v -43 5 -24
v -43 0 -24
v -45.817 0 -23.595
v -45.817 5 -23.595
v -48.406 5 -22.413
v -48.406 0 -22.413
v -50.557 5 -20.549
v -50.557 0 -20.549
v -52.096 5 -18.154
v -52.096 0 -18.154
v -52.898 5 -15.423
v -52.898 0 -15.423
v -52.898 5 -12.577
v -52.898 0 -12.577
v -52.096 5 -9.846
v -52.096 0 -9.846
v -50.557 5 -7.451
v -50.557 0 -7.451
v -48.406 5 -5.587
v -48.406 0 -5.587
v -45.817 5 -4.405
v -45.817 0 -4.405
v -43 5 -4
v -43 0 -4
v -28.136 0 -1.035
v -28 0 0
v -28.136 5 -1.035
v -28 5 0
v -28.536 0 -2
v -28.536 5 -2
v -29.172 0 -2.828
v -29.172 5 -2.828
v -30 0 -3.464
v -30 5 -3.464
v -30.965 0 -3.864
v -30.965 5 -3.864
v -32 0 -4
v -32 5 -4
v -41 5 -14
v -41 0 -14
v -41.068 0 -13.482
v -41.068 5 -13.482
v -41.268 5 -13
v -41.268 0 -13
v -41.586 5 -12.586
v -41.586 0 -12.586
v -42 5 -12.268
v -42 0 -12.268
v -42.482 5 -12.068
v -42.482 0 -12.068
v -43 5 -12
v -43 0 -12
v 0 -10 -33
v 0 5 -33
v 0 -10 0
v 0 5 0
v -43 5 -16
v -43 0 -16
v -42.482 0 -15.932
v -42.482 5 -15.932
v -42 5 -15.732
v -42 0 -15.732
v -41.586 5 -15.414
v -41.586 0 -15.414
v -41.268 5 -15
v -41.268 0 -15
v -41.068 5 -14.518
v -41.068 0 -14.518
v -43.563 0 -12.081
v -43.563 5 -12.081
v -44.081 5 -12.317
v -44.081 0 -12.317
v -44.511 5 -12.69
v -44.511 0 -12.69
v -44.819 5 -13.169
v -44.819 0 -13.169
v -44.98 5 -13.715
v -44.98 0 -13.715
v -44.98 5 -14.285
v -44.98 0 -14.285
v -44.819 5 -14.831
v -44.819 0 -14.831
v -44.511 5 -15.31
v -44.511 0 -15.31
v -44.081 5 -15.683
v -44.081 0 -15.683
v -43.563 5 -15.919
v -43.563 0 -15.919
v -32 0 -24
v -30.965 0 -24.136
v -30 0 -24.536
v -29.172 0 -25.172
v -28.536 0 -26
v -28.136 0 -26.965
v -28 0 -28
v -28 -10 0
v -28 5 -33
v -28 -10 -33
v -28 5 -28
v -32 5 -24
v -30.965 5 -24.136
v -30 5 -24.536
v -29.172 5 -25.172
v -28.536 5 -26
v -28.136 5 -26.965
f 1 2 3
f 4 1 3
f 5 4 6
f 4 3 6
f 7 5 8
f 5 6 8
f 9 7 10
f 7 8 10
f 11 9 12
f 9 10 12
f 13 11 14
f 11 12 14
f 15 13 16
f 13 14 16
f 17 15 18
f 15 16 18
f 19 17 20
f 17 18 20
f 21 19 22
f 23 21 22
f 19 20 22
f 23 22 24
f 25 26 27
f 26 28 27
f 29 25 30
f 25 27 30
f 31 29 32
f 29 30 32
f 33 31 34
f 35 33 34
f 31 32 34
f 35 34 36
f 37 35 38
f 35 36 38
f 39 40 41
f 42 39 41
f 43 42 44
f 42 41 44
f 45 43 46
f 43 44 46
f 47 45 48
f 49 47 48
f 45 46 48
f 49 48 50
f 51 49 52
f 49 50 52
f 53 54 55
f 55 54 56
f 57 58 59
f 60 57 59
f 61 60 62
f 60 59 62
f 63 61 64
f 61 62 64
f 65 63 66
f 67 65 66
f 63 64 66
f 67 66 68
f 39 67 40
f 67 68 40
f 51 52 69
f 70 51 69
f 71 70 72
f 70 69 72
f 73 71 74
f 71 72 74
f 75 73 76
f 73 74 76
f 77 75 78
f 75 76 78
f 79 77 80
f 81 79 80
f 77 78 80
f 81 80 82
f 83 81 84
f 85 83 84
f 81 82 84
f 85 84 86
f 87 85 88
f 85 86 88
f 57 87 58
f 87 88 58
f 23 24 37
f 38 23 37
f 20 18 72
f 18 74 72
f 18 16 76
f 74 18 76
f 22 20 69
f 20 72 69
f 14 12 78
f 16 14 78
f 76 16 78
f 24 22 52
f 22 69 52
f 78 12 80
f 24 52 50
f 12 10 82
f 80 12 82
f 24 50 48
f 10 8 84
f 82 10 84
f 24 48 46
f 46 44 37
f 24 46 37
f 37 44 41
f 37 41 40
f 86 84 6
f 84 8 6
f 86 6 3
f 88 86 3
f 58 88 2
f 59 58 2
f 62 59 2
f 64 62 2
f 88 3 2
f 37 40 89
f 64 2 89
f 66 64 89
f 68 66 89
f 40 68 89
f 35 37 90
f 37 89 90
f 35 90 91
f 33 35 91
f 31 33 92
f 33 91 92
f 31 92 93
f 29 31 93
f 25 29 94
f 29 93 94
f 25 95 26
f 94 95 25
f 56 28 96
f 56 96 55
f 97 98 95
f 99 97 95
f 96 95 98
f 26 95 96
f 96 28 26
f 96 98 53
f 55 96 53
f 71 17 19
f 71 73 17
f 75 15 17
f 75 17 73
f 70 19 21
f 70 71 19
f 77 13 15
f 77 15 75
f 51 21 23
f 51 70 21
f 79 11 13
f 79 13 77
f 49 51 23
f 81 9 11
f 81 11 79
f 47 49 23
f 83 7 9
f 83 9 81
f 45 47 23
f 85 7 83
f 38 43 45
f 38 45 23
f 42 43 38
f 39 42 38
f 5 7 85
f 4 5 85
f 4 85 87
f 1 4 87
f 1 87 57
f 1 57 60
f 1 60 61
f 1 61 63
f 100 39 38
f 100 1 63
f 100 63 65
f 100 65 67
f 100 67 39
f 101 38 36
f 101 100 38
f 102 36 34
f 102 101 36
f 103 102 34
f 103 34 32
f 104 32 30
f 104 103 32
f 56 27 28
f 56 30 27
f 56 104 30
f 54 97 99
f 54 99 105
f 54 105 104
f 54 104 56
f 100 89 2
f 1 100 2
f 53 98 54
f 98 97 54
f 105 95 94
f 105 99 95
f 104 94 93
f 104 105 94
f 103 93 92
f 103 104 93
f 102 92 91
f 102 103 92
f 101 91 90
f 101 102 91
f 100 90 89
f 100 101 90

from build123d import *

# Parameters (mm, degrees)
AUFSATZ_LINEAR_AUSTRAGEN1_DEPTH = 5
SKIZZE4_W                       = 28
SKIZZE4_H                       = 33
AUFSATZ_LINEAR_AUSTRAGEN3_DEPTH = 10
VERRUNDUNG1_R                   = 4
VERRUNDUNG2_R                   = 4


with BuildPart() as part:
    # Skizze2 → Aufsatz-Linear austragen1 (new body)
    with BuildSketch(Plane(origin=(0, 0, 0), x_dir=(1, 0, 0), z_dir=(0, 1, 0))):
        with BuildLine():
            Line((0, 33), (-28, 33))
            Line((-28, 33), (-28, 24))
            Line((-28, 24), (-43, 24))
            ThreePointArc((-43, 24), (-35.928932188, 21.071067812), (-33, 14))
            ThreePointArc((-33, 14), (-35.928932188, 6.928932188), (-43, 4))
            Line((-43, 4), (-28, 4))
            Line((-28, 4), (-28, 0))
            Line((-28, 0), (0, 0))
            Line((0, 0), (0, 33))
        make_face()
        with BuildLine():
            ThreePointArc((-33, 14), (-35.928932188, 21.071067812), (-43, 24))
            Line((-43, 24), (-43, 16))
            ThreePointArc((-43, 16), (-41.585786438, 15.414213562), (-41, 14))
            ThreePointArc((-41, 14), (-41.585786438, 12.585786438), (-43, 12))
            Line((-43, 12), (-43, 4))
            ThreePointArc((-43, 4), (-35.928932188, 6.928932188), (-33, 14))
        make_face()
        with BuildLine():
            Line((-43, 16), (-43, 24))
            ThreePointArc((-43, 24), (-53, 14), (-43, 4))
            Line((-43, 4), (-43, 12))
            ThreePointArc((-43, 12), (-45, 14), (-43, 16))
        make_face()
    extrude(amount=AUFSATZ_LINEAR_AUSTRAGEN1_DEPTH)

    # Skizze4 → Aufsatz-Linear austragen3 (add)
    with BuildSketch(Plane.XZ):
        with Locations((-14, -16.5)):
            Rectangle(SKIZZE4_W, SKIZZE4_H)
    extrude(amount=AUFSATZ_LINEAR_AUSTRAGEN3_DEPTH)

    # Verrundung1
    verrundung1_edges = [part.edges().sort_by_distance(p)[0] for p in [
        (-28, 2.5, -4),
    ]]
    fillet(verrundung1_edges, radius=VERRUNDUNG1_R - 0.0001)  # a hair under: the kernel refuses the full size

    # Verrundung2
    verrundung2_edges = [part.edges().sort_by_distance(p)[0] for p in [
        (-28, 2.5, -24),
    ]]
    fillet(verrundung2_edges, radius=VERRUNDUNG2_R)


solid = part.part
